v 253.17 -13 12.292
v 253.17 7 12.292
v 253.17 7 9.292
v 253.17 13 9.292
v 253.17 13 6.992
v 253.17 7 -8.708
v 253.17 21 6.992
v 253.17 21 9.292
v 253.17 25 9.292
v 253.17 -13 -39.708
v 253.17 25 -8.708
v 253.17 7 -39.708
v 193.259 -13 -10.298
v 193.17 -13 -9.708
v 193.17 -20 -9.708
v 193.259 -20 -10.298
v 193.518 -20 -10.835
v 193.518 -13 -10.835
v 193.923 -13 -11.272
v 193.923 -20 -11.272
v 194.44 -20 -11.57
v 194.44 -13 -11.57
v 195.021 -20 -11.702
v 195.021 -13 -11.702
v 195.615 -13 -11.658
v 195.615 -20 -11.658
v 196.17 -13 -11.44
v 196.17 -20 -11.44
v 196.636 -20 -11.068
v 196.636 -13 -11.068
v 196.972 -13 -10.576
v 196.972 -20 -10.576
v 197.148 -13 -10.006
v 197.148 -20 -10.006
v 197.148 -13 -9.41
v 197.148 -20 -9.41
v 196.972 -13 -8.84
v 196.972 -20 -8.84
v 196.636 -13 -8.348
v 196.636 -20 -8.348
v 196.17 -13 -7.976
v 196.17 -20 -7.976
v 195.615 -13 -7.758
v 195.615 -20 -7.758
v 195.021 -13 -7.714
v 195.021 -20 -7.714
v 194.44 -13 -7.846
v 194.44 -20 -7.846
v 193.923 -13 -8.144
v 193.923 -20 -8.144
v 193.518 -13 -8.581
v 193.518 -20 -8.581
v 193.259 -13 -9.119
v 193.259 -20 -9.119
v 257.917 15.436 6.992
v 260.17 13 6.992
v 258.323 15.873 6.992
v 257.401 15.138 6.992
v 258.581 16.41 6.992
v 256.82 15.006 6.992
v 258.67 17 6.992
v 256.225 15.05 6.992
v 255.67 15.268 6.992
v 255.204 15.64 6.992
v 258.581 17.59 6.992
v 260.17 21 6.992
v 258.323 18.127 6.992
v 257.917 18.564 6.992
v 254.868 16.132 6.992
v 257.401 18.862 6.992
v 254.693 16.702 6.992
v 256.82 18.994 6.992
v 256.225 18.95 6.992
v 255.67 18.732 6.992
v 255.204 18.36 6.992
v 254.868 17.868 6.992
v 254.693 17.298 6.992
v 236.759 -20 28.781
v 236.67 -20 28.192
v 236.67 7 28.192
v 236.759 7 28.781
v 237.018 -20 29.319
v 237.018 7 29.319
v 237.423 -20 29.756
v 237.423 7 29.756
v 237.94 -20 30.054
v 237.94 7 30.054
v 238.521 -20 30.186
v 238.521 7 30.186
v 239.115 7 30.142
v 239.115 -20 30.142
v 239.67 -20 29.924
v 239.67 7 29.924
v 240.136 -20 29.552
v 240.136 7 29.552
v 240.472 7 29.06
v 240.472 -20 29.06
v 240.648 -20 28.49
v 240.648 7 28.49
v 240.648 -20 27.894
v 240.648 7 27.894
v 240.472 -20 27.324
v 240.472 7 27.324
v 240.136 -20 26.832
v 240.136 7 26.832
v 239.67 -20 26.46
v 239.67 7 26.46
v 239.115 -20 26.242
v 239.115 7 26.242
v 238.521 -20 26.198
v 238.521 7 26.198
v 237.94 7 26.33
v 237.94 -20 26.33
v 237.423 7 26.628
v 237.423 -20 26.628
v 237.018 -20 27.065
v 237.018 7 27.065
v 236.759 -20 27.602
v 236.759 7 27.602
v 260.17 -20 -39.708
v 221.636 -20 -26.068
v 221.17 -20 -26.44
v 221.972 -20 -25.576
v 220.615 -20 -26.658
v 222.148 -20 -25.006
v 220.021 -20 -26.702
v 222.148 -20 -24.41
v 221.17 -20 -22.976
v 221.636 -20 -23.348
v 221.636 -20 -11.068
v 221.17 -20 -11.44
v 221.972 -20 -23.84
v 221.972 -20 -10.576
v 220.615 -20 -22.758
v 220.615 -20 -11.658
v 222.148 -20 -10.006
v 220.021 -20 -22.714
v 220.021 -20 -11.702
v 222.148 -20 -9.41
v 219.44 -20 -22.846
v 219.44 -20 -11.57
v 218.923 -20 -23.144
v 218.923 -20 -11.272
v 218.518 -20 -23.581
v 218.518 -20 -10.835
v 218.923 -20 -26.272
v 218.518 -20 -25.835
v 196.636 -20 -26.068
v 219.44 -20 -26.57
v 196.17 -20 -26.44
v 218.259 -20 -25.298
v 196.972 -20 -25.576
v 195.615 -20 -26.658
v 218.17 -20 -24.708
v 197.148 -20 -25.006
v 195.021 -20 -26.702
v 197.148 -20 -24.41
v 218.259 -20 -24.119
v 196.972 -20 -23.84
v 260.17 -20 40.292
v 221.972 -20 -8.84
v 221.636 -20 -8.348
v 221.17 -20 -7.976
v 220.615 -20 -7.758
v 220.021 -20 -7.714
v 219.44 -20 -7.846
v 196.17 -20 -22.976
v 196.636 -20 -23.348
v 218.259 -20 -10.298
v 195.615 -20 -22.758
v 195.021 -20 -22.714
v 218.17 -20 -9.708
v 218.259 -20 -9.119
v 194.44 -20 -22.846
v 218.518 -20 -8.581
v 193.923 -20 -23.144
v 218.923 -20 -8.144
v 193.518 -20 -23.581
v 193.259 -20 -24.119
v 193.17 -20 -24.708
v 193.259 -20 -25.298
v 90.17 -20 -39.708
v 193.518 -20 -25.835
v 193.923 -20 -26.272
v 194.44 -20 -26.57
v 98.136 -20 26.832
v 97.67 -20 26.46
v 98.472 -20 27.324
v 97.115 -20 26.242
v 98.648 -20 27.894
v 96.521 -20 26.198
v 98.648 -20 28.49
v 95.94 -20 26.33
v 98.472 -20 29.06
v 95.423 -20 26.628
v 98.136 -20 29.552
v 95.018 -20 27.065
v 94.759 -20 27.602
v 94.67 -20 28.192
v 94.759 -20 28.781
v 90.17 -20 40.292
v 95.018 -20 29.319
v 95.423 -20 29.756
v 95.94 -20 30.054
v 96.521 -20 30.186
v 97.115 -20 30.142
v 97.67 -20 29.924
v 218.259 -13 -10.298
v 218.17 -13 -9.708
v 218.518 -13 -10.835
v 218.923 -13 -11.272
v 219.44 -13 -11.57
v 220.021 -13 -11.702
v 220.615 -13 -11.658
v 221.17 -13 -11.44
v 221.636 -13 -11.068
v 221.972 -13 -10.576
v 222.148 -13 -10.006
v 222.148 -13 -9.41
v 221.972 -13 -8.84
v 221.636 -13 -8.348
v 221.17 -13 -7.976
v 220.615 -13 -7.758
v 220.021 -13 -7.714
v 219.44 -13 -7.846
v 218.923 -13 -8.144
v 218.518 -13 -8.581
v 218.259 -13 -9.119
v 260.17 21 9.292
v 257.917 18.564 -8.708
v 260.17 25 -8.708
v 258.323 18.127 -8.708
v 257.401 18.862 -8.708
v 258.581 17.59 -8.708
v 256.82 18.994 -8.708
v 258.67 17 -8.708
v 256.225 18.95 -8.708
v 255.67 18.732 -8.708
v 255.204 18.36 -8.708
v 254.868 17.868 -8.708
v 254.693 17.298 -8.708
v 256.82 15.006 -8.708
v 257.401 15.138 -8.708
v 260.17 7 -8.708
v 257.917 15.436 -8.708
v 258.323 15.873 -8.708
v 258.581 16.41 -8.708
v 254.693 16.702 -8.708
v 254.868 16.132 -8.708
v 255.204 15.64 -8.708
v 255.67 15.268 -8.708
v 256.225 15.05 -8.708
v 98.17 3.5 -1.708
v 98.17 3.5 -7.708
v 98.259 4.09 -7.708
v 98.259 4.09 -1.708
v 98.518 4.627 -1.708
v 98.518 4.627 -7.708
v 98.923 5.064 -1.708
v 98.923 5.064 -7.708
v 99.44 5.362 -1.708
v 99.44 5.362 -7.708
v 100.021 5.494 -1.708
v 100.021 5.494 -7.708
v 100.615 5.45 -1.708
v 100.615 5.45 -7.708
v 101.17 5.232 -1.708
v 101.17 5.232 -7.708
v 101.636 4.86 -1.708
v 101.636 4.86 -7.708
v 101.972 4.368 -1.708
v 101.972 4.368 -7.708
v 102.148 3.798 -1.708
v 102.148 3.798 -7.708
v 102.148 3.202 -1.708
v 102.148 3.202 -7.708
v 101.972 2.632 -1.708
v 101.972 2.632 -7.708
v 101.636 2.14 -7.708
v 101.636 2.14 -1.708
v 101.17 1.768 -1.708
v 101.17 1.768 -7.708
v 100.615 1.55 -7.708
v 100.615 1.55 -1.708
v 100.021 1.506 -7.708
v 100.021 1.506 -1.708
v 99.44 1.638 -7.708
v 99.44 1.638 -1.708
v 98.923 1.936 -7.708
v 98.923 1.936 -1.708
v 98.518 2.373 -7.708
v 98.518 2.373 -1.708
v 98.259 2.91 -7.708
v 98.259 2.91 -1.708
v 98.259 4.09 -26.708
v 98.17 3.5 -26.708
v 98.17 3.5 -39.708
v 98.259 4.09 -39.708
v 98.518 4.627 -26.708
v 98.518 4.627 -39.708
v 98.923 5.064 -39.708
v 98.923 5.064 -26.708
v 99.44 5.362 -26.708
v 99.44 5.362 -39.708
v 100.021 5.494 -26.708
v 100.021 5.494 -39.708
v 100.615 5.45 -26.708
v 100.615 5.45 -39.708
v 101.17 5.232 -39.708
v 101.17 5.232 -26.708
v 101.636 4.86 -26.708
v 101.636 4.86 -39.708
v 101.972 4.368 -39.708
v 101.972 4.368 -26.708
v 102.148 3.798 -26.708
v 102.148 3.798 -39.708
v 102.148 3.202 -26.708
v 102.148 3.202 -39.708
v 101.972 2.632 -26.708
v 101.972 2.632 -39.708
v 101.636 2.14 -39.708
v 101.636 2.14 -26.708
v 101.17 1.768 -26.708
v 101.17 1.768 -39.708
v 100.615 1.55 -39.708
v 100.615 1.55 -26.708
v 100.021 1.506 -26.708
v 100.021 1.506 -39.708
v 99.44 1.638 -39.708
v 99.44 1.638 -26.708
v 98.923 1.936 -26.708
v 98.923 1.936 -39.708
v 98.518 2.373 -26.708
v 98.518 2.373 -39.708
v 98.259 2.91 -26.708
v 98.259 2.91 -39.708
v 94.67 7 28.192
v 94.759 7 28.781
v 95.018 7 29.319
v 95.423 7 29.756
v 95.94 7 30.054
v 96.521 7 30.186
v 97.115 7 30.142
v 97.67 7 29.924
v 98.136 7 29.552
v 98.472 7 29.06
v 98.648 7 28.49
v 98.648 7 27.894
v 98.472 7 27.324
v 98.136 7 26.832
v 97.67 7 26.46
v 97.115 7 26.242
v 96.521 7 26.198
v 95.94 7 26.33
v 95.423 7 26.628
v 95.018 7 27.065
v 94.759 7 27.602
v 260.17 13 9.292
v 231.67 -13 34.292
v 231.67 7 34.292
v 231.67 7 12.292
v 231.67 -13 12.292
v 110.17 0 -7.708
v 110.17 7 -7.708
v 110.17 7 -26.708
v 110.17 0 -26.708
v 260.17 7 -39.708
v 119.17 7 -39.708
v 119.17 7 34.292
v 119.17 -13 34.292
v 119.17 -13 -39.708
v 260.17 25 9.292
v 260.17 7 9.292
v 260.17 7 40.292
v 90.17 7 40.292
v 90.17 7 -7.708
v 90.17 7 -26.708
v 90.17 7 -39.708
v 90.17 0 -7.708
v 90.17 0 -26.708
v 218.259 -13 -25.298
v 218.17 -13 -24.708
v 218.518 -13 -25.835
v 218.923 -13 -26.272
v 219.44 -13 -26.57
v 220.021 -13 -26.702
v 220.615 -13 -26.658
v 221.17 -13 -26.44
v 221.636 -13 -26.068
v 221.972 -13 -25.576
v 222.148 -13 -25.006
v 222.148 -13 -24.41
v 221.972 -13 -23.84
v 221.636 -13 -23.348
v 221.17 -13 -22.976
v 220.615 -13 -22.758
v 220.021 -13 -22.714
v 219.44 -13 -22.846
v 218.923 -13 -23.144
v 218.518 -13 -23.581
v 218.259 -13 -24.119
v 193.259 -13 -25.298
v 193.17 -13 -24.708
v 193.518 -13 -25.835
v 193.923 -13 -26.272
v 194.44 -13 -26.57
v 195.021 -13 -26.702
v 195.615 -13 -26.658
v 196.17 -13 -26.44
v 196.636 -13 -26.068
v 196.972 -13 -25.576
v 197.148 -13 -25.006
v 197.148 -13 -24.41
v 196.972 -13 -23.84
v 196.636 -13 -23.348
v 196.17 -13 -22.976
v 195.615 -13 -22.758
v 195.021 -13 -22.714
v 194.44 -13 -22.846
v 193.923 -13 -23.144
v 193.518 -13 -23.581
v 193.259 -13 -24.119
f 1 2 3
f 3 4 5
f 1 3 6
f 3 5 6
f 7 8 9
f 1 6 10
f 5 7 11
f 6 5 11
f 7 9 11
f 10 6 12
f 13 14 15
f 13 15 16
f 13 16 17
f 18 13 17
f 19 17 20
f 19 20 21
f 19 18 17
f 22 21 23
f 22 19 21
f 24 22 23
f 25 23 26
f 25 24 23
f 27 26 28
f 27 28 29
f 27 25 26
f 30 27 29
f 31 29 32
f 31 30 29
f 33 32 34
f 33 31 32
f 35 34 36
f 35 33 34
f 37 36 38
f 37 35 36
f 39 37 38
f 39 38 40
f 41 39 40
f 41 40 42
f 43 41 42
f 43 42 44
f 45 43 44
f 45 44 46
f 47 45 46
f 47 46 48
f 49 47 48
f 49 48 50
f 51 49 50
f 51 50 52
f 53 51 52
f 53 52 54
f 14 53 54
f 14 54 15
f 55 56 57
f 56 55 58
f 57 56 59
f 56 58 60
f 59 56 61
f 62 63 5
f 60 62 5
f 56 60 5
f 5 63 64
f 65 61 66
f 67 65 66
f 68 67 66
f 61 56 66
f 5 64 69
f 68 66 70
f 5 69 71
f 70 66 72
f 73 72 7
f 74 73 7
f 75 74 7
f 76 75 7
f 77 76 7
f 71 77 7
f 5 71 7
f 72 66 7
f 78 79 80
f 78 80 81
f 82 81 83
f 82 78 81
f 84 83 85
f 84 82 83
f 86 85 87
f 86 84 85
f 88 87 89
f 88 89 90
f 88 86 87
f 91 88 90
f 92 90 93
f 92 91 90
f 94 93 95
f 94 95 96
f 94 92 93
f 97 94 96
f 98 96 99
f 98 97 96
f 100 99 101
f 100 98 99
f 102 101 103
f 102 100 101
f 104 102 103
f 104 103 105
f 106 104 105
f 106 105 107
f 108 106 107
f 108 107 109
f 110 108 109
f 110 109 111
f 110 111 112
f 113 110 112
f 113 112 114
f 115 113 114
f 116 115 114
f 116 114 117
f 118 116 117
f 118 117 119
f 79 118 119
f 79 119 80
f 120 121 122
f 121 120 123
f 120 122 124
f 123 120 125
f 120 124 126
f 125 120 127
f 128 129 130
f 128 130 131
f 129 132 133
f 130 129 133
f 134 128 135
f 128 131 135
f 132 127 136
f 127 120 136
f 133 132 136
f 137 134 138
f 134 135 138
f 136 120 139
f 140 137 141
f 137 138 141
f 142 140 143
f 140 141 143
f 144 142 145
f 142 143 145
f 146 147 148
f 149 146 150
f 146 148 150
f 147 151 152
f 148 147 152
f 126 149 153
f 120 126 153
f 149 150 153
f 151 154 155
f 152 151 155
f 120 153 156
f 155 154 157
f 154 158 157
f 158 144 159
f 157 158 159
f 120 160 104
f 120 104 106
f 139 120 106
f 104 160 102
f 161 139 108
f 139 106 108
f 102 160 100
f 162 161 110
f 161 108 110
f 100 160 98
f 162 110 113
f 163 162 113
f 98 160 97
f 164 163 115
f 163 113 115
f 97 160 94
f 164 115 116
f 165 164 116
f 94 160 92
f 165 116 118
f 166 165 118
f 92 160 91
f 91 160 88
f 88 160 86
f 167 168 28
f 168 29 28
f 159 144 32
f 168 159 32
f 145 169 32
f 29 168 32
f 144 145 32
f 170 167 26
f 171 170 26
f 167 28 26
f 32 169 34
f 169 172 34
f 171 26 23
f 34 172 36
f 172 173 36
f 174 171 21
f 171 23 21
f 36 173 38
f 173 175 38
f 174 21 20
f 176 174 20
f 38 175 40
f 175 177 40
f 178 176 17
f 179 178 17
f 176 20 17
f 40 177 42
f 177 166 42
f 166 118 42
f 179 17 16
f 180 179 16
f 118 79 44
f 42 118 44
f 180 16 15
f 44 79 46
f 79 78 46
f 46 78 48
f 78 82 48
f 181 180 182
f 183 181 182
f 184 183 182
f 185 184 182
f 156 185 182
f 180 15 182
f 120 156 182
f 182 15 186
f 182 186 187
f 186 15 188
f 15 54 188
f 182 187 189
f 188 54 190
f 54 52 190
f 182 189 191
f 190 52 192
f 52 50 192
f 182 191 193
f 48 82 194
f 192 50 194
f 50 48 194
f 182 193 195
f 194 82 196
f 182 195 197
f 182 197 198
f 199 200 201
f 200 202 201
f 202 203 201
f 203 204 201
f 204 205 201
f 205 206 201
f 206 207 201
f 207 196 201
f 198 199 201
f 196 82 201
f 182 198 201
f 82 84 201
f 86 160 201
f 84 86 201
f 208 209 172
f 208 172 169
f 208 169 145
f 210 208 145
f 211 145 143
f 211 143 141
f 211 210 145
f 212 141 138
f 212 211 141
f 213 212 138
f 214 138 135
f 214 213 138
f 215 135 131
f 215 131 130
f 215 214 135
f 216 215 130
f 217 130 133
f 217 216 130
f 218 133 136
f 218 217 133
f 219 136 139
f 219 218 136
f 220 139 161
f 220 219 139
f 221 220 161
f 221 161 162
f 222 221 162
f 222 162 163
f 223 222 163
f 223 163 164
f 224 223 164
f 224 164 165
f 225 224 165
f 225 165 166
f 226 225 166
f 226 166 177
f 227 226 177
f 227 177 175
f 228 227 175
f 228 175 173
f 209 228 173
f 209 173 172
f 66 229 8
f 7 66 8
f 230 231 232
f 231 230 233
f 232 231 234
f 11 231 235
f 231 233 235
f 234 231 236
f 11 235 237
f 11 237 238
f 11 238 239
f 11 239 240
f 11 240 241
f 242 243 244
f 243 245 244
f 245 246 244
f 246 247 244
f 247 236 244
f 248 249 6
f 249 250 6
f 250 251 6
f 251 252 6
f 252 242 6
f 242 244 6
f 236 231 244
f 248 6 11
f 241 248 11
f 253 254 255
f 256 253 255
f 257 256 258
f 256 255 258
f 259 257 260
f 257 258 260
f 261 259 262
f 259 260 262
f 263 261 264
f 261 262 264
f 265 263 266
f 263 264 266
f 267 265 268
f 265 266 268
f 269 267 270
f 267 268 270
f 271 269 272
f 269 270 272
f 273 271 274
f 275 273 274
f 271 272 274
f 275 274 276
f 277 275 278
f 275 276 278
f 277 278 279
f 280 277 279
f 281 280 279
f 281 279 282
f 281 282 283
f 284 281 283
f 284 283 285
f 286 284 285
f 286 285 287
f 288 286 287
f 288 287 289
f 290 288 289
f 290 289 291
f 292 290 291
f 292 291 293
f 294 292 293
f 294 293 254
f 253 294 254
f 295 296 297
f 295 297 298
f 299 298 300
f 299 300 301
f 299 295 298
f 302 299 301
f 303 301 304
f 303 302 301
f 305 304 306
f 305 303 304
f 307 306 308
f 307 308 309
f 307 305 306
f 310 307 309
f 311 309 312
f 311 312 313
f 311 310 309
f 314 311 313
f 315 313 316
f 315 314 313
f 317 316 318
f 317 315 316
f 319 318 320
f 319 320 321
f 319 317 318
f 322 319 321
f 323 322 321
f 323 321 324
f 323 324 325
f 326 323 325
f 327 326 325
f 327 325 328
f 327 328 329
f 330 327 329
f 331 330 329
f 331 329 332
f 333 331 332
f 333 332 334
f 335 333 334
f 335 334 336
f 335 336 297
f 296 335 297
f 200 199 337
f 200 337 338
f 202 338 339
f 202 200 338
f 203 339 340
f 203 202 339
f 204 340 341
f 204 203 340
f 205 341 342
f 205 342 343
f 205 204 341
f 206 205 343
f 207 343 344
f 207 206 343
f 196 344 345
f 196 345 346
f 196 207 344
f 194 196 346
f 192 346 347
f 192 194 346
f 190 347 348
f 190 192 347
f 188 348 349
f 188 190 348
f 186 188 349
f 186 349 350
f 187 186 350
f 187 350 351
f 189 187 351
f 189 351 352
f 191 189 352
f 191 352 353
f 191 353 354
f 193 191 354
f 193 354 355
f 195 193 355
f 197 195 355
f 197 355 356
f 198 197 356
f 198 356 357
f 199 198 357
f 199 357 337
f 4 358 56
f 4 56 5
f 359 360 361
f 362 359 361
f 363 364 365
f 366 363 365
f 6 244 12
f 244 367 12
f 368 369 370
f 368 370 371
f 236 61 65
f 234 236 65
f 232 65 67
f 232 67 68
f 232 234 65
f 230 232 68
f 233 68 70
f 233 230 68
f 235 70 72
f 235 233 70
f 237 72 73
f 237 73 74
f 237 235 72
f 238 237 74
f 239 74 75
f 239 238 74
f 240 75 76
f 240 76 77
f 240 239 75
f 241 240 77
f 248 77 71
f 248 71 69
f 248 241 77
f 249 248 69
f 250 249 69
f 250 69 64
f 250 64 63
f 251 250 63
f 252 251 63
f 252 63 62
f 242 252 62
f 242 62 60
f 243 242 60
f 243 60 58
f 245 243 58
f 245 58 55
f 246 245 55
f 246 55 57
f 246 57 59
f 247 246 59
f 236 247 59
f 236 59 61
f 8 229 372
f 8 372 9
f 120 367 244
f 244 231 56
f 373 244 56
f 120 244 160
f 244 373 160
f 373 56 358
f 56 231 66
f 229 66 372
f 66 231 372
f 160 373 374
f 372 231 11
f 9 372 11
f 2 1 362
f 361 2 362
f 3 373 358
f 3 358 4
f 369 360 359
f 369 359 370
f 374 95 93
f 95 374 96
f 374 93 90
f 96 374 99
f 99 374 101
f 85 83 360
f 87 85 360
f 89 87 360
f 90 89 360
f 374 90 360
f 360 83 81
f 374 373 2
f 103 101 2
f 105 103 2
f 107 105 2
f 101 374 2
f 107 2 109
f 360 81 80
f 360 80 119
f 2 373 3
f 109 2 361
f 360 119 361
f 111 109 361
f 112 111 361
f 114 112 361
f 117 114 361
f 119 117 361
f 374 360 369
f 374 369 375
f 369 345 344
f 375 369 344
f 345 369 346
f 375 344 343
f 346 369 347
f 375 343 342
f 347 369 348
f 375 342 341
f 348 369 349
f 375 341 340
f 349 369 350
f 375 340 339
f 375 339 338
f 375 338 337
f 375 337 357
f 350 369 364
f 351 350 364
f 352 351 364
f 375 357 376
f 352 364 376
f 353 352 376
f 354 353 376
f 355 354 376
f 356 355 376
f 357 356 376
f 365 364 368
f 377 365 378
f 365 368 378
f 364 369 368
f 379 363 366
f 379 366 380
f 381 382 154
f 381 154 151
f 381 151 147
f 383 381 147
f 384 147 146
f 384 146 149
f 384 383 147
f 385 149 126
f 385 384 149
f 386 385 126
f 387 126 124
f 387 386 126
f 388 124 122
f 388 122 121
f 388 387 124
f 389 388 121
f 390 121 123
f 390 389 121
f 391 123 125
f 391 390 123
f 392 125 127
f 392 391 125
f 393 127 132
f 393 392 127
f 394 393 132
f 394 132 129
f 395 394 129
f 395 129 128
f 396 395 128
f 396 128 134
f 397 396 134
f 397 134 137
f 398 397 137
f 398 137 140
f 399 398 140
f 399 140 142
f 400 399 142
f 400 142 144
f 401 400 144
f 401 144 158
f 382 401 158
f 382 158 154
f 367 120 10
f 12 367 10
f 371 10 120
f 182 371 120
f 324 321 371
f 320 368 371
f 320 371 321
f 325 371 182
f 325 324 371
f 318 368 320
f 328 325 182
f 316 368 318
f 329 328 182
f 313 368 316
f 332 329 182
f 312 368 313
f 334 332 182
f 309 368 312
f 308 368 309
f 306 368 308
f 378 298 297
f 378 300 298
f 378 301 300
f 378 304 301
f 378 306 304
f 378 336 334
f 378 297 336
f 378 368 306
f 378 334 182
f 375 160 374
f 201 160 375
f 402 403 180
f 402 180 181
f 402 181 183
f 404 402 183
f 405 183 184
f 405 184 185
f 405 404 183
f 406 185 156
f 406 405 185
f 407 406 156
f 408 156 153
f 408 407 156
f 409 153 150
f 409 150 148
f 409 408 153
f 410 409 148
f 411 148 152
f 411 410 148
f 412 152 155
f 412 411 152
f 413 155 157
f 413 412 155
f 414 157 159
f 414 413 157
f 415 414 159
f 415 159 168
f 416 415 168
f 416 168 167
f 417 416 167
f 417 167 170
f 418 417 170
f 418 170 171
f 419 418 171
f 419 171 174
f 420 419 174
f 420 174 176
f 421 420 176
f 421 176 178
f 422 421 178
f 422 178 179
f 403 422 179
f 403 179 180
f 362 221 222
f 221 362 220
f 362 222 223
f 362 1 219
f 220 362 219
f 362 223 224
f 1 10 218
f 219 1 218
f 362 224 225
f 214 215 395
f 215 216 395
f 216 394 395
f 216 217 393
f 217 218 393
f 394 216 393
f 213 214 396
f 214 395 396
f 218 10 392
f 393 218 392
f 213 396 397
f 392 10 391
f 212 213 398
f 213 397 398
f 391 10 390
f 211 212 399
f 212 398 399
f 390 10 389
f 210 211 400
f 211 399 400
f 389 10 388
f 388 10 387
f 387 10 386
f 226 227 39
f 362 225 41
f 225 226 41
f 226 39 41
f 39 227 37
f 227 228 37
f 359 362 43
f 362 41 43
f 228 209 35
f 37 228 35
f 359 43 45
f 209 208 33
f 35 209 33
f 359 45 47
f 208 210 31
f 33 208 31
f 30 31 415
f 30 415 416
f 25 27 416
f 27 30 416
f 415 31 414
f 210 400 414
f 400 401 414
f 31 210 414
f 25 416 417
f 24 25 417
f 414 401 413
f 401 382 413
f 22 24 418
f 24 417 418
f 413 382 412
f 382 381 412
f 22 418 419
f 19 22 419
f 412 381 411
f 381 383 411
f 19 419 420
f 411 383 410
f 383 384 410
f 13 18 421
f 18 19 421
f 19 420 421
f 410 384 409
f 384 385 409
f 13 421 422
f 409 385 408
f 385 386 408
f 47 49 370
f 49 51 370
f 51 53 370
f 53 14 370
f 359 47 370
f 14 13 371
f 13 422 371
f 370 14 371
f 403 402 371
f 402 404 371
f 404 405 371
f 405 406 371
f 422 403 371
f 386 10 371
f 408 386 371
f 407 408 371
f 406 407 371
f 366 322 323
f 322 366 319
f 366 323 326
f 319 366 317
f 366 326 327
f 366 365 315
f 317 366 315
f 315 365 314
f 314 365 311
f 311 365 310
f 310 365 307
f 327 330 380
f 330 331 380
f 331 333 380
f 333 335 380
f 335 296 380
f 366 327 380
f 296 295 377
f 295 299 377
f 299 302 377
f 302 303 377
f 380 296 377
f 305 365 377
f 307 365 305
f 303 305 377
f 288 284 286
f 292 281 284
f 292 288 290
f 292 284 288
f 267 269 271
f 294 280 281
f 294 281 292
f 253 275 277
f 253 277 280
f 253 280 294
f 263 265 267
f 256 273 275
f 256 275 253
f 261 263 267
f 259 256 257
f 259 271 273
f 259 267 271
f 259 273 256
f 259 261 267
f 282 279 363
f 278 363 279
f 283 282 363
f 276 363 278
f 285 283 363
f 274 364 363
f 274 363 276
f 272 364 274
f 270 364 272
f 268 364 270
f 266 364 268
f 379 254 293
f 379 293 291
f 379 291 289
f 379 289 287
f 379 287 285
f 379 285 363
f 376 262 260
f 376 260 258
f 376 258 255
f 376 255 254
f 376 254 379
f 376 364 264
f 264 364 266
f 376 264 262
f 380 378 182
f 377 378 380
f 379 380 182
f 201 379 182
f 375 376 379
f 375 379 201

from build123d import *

# Parameters (mm, degrees)
SKETCH1_W               = 170
SKETCH1_H               = 80
BOSS_EXTRUDE1_DEPTH     = 7
SKETCH2_W               = 7
SKETCH2_H               = 18
BOSS_EXTRUDE2_DEPTH     = 18
SKETCH3_R               = 2
CUT_EXTRUDE1_DEPTH      = 20
SKETCH4_W               = 7
SKETCH4_H               = 8
CUT_EXTRUDE2_DEPTH      = 2.3
SKETCH6_W               = 20
SKETCH6_H               = 19
CUT_EXTRUDE4_DEPTH      = 11
SKETCH7_R               = 2
CUT_EXTRUDE5_DEPTH      = 25
SKETCH7_2_R             = 2
CUT_EXTRUDE6_DEPTH      = 25
SKETCH8_W               = 170
SKETCH8_H               = 80
BOSS_EXTRUDE3_DEPTH     = 20
SKETCH9_W               = 134
SKETCH9_H               = 80
CUT_EXTRUDE7_DEPTH      = 20
SKETCH12_W              = 134
SKETCH12_H              = 28
BOSS_EXTRUDE4_DEPTH     = 20
SKETCH10_R              = 2
CUT_EXTRUDE9_DEPTH      = 1
CUT_EXTRUDE9_DEPTH_BACK = 46
SKETCH13_W              = 112.5
SKETCH13_H              = 22
CUT_EXTRUDE10_DEPTH     = 20
SKETCH14_R              = 2
CUT_EXTRUDE11_DEPTH     = 10


with BuildPart() as part:
    # Sketch1 → Boss-Extrude1 (new body)
    with BuildSketch(Plane(origin=(0, 0, 0), x_dir=(1, 0, 0), z_dir=(0, 1, 0))):
        with Locations((5.170316302, -0.291970803)):
            Rectangle(SKETCH1_W, SKETCH1_H)
    extrude(amount=BOSS_EXTRUDE1_DEPTH)

    # Sketch2 → Boss-Extrude2 (add)
    with BuildSketch(Plane(origin=(0, 7, 0), x_dir=(1, 0, 0), z_dir=(0, 1, 0))):
        with Locations((-76.329683698, -0.291970803)):
            Rectangle(SKETCH2_W, SKETCH2_H)
    extrude(amount=BOSS_EXTRUDE2_DEPTH)

    # Sketch3 → Cut-Extrude1 (cut)
    with BuildSketch(Plane(origin=(0, 0, -8.708029197), x_dir=(-1, 0, 0), z_dir=(0, 0, -1))):
        with Locations((76.329683698, 17)):
            Circle(SKETCH3_R)
    extrude(amount=-CUT_EXTRUDE1_DEPTH, mode=Mode.SUBTRACT)

    # Sketch4 → Cut-Extrude2 (cut)
    with BuildSketch(Plane.XY.offset(9.291970803)):
        with Locations((-76.329683698, 17)):
            Rectangle(SKETCH4_W, SKETCH4_H)
    extrude(amount=-CUT_EXTRUDE2_DEPTH, mode=Mode.SUBTRACT)

    # Sketch6 → Cut-Extrude4 (cut)
    with BuildSketch(Plane(origin=(0, 7, 0), x_dir=(1, 0, 0), z_dir=(0, 1, 0))):
        with Locations((80.170316302, 17.208029197)):
            Rectangle(SKETCH6_W, SKETCH6_H)
    extrude(amount=-CUT_EXTRUDE4_DEPTH, mode=Mode.SUBTRACT)

    # Sketch7 → Cut-Extrude5 (cut)
    with BuildSketch(Plane.XY.offset(-26.708029197)):
        with Locations((80.170316302, 3.5)):
            Circle(SKETCH7_R)
    extrude(amount=-CUT_EXTRUDE5_DEPTH, mode=Mode.SUBTRACT)

    # Sketch7<2> → Cut-Extrude6 (cut)
    with BuildSketch(Plane.XY.offset(-26.708029197)):
        with Locations((80.170316302, 3.5)):
            Circle(SKETCH7_2_R)
    extrude(amount=CUT_EXTRUDE6_DEPTH, mode=Mode.SUBTRACT)

    # Sketch8 → Boss-Extrude3 (add)
    with BuildSketch(Plane.XZ):
        with Locations((5.170316302, 0.291970803)):
            Rectangle(SKETCH8_W, SKETCH8_H)
    extrude(amount=BOSS_EXTRUDE3_DEPTH)

    # Sketch9 → Cut-Extrude7 (cut)
    with BuildSketch(Plane(origin=(0, 7, 0), x_dir=(1, 0, 0), z_dir=(0, 1, 0))):
        with Locations((-5.829683698, -0.291970803)):
            Rectangle(SKETCH9_W, SKETCH9_H)
    extrude(amount=-CUT_EXTRUDE7_DEPTH, mode=Mode.SUBTRACT)

    # Sketch12 → Boss-Extrude4 (add)
    with BuildSketch(Plane(origin=(0, -13, 0), x_dir=(1, 0, 0), z_dir=(0, 1, 0))):
        with Locations((-5.829683698, -26.291970803)):
            Rectangle(SKETCH12_W, SKETCH12_H)
    extrude(amount=BOSS_EXTRUDE4_DEPTH)

    # Sketch10 → Cut-Extrude9 (cut, two sides)
    with BuildSketch(Plane.XZ.offset(20)) as cut_extrude9_sk:
        with Locations((83.670316302, 28.191970803)):
            Circle(SKETCH10_R)
        with Locations((-58.329683698, 28.191970803)):
            Circle(SKETCH10_R)
    extrude(amount=CUT_EXTRUDE9_DEPTH, mode=Mode.SUBTRACT)
    extrude(cut_extrude9_sk.sketch, amount=-CUT_EXTRUDE9_DEPTH_BACK, mode=Mode.SUBTRACT)

    # Sketch13 → Cut-Extrude10 (cut)
    with BuildSketch(Plane(origin=(0, 7, 0), x_dir=(1, 0, 0), z_dir=(0, 1, 0))):
        with Locations((4.920316302, -23.291970803)):
            Rectangle(SKETCH13_W, SKETCH13_H)
    extrude(amount=-CUT_EXTRUDE10_DEPTH, mode=Mode.SUBTRACT)

    # Sketch14 → Cut-Extrude11 (cut)
    with BuildSketch(Plane(origin=(0, -13, 0), x_dir=(1, 0, 0), z_dir=(0, 1, 0))):
        with Locations((-39.829683698, 24.708029197)):
            Circle(SKETCH14_R)
        with Locations((-39.829683698, 9.708029197)):
            Circle(SKETCH14_R)
        with Locations((-14.829683698, 9.708029197)):
            Circle(SKETCH14_R)
        with Locations((-14.829683698, 24.708029197)):
            Circle(SKETCH14_R)
    extrude(amount=-CUT_EXTRUDE11_DEPTH, mode=Mode.SUBTRACT)


with BuildPart() as body_2:
    # Mirror2: mirrored copy
    add(part.part.mirror(Plane(origin=(90.170316302, 7, -39.708029197), x_dir=(0, 0, 1), z_dir=(-1, 0, 0))))


solid = body_2.part
